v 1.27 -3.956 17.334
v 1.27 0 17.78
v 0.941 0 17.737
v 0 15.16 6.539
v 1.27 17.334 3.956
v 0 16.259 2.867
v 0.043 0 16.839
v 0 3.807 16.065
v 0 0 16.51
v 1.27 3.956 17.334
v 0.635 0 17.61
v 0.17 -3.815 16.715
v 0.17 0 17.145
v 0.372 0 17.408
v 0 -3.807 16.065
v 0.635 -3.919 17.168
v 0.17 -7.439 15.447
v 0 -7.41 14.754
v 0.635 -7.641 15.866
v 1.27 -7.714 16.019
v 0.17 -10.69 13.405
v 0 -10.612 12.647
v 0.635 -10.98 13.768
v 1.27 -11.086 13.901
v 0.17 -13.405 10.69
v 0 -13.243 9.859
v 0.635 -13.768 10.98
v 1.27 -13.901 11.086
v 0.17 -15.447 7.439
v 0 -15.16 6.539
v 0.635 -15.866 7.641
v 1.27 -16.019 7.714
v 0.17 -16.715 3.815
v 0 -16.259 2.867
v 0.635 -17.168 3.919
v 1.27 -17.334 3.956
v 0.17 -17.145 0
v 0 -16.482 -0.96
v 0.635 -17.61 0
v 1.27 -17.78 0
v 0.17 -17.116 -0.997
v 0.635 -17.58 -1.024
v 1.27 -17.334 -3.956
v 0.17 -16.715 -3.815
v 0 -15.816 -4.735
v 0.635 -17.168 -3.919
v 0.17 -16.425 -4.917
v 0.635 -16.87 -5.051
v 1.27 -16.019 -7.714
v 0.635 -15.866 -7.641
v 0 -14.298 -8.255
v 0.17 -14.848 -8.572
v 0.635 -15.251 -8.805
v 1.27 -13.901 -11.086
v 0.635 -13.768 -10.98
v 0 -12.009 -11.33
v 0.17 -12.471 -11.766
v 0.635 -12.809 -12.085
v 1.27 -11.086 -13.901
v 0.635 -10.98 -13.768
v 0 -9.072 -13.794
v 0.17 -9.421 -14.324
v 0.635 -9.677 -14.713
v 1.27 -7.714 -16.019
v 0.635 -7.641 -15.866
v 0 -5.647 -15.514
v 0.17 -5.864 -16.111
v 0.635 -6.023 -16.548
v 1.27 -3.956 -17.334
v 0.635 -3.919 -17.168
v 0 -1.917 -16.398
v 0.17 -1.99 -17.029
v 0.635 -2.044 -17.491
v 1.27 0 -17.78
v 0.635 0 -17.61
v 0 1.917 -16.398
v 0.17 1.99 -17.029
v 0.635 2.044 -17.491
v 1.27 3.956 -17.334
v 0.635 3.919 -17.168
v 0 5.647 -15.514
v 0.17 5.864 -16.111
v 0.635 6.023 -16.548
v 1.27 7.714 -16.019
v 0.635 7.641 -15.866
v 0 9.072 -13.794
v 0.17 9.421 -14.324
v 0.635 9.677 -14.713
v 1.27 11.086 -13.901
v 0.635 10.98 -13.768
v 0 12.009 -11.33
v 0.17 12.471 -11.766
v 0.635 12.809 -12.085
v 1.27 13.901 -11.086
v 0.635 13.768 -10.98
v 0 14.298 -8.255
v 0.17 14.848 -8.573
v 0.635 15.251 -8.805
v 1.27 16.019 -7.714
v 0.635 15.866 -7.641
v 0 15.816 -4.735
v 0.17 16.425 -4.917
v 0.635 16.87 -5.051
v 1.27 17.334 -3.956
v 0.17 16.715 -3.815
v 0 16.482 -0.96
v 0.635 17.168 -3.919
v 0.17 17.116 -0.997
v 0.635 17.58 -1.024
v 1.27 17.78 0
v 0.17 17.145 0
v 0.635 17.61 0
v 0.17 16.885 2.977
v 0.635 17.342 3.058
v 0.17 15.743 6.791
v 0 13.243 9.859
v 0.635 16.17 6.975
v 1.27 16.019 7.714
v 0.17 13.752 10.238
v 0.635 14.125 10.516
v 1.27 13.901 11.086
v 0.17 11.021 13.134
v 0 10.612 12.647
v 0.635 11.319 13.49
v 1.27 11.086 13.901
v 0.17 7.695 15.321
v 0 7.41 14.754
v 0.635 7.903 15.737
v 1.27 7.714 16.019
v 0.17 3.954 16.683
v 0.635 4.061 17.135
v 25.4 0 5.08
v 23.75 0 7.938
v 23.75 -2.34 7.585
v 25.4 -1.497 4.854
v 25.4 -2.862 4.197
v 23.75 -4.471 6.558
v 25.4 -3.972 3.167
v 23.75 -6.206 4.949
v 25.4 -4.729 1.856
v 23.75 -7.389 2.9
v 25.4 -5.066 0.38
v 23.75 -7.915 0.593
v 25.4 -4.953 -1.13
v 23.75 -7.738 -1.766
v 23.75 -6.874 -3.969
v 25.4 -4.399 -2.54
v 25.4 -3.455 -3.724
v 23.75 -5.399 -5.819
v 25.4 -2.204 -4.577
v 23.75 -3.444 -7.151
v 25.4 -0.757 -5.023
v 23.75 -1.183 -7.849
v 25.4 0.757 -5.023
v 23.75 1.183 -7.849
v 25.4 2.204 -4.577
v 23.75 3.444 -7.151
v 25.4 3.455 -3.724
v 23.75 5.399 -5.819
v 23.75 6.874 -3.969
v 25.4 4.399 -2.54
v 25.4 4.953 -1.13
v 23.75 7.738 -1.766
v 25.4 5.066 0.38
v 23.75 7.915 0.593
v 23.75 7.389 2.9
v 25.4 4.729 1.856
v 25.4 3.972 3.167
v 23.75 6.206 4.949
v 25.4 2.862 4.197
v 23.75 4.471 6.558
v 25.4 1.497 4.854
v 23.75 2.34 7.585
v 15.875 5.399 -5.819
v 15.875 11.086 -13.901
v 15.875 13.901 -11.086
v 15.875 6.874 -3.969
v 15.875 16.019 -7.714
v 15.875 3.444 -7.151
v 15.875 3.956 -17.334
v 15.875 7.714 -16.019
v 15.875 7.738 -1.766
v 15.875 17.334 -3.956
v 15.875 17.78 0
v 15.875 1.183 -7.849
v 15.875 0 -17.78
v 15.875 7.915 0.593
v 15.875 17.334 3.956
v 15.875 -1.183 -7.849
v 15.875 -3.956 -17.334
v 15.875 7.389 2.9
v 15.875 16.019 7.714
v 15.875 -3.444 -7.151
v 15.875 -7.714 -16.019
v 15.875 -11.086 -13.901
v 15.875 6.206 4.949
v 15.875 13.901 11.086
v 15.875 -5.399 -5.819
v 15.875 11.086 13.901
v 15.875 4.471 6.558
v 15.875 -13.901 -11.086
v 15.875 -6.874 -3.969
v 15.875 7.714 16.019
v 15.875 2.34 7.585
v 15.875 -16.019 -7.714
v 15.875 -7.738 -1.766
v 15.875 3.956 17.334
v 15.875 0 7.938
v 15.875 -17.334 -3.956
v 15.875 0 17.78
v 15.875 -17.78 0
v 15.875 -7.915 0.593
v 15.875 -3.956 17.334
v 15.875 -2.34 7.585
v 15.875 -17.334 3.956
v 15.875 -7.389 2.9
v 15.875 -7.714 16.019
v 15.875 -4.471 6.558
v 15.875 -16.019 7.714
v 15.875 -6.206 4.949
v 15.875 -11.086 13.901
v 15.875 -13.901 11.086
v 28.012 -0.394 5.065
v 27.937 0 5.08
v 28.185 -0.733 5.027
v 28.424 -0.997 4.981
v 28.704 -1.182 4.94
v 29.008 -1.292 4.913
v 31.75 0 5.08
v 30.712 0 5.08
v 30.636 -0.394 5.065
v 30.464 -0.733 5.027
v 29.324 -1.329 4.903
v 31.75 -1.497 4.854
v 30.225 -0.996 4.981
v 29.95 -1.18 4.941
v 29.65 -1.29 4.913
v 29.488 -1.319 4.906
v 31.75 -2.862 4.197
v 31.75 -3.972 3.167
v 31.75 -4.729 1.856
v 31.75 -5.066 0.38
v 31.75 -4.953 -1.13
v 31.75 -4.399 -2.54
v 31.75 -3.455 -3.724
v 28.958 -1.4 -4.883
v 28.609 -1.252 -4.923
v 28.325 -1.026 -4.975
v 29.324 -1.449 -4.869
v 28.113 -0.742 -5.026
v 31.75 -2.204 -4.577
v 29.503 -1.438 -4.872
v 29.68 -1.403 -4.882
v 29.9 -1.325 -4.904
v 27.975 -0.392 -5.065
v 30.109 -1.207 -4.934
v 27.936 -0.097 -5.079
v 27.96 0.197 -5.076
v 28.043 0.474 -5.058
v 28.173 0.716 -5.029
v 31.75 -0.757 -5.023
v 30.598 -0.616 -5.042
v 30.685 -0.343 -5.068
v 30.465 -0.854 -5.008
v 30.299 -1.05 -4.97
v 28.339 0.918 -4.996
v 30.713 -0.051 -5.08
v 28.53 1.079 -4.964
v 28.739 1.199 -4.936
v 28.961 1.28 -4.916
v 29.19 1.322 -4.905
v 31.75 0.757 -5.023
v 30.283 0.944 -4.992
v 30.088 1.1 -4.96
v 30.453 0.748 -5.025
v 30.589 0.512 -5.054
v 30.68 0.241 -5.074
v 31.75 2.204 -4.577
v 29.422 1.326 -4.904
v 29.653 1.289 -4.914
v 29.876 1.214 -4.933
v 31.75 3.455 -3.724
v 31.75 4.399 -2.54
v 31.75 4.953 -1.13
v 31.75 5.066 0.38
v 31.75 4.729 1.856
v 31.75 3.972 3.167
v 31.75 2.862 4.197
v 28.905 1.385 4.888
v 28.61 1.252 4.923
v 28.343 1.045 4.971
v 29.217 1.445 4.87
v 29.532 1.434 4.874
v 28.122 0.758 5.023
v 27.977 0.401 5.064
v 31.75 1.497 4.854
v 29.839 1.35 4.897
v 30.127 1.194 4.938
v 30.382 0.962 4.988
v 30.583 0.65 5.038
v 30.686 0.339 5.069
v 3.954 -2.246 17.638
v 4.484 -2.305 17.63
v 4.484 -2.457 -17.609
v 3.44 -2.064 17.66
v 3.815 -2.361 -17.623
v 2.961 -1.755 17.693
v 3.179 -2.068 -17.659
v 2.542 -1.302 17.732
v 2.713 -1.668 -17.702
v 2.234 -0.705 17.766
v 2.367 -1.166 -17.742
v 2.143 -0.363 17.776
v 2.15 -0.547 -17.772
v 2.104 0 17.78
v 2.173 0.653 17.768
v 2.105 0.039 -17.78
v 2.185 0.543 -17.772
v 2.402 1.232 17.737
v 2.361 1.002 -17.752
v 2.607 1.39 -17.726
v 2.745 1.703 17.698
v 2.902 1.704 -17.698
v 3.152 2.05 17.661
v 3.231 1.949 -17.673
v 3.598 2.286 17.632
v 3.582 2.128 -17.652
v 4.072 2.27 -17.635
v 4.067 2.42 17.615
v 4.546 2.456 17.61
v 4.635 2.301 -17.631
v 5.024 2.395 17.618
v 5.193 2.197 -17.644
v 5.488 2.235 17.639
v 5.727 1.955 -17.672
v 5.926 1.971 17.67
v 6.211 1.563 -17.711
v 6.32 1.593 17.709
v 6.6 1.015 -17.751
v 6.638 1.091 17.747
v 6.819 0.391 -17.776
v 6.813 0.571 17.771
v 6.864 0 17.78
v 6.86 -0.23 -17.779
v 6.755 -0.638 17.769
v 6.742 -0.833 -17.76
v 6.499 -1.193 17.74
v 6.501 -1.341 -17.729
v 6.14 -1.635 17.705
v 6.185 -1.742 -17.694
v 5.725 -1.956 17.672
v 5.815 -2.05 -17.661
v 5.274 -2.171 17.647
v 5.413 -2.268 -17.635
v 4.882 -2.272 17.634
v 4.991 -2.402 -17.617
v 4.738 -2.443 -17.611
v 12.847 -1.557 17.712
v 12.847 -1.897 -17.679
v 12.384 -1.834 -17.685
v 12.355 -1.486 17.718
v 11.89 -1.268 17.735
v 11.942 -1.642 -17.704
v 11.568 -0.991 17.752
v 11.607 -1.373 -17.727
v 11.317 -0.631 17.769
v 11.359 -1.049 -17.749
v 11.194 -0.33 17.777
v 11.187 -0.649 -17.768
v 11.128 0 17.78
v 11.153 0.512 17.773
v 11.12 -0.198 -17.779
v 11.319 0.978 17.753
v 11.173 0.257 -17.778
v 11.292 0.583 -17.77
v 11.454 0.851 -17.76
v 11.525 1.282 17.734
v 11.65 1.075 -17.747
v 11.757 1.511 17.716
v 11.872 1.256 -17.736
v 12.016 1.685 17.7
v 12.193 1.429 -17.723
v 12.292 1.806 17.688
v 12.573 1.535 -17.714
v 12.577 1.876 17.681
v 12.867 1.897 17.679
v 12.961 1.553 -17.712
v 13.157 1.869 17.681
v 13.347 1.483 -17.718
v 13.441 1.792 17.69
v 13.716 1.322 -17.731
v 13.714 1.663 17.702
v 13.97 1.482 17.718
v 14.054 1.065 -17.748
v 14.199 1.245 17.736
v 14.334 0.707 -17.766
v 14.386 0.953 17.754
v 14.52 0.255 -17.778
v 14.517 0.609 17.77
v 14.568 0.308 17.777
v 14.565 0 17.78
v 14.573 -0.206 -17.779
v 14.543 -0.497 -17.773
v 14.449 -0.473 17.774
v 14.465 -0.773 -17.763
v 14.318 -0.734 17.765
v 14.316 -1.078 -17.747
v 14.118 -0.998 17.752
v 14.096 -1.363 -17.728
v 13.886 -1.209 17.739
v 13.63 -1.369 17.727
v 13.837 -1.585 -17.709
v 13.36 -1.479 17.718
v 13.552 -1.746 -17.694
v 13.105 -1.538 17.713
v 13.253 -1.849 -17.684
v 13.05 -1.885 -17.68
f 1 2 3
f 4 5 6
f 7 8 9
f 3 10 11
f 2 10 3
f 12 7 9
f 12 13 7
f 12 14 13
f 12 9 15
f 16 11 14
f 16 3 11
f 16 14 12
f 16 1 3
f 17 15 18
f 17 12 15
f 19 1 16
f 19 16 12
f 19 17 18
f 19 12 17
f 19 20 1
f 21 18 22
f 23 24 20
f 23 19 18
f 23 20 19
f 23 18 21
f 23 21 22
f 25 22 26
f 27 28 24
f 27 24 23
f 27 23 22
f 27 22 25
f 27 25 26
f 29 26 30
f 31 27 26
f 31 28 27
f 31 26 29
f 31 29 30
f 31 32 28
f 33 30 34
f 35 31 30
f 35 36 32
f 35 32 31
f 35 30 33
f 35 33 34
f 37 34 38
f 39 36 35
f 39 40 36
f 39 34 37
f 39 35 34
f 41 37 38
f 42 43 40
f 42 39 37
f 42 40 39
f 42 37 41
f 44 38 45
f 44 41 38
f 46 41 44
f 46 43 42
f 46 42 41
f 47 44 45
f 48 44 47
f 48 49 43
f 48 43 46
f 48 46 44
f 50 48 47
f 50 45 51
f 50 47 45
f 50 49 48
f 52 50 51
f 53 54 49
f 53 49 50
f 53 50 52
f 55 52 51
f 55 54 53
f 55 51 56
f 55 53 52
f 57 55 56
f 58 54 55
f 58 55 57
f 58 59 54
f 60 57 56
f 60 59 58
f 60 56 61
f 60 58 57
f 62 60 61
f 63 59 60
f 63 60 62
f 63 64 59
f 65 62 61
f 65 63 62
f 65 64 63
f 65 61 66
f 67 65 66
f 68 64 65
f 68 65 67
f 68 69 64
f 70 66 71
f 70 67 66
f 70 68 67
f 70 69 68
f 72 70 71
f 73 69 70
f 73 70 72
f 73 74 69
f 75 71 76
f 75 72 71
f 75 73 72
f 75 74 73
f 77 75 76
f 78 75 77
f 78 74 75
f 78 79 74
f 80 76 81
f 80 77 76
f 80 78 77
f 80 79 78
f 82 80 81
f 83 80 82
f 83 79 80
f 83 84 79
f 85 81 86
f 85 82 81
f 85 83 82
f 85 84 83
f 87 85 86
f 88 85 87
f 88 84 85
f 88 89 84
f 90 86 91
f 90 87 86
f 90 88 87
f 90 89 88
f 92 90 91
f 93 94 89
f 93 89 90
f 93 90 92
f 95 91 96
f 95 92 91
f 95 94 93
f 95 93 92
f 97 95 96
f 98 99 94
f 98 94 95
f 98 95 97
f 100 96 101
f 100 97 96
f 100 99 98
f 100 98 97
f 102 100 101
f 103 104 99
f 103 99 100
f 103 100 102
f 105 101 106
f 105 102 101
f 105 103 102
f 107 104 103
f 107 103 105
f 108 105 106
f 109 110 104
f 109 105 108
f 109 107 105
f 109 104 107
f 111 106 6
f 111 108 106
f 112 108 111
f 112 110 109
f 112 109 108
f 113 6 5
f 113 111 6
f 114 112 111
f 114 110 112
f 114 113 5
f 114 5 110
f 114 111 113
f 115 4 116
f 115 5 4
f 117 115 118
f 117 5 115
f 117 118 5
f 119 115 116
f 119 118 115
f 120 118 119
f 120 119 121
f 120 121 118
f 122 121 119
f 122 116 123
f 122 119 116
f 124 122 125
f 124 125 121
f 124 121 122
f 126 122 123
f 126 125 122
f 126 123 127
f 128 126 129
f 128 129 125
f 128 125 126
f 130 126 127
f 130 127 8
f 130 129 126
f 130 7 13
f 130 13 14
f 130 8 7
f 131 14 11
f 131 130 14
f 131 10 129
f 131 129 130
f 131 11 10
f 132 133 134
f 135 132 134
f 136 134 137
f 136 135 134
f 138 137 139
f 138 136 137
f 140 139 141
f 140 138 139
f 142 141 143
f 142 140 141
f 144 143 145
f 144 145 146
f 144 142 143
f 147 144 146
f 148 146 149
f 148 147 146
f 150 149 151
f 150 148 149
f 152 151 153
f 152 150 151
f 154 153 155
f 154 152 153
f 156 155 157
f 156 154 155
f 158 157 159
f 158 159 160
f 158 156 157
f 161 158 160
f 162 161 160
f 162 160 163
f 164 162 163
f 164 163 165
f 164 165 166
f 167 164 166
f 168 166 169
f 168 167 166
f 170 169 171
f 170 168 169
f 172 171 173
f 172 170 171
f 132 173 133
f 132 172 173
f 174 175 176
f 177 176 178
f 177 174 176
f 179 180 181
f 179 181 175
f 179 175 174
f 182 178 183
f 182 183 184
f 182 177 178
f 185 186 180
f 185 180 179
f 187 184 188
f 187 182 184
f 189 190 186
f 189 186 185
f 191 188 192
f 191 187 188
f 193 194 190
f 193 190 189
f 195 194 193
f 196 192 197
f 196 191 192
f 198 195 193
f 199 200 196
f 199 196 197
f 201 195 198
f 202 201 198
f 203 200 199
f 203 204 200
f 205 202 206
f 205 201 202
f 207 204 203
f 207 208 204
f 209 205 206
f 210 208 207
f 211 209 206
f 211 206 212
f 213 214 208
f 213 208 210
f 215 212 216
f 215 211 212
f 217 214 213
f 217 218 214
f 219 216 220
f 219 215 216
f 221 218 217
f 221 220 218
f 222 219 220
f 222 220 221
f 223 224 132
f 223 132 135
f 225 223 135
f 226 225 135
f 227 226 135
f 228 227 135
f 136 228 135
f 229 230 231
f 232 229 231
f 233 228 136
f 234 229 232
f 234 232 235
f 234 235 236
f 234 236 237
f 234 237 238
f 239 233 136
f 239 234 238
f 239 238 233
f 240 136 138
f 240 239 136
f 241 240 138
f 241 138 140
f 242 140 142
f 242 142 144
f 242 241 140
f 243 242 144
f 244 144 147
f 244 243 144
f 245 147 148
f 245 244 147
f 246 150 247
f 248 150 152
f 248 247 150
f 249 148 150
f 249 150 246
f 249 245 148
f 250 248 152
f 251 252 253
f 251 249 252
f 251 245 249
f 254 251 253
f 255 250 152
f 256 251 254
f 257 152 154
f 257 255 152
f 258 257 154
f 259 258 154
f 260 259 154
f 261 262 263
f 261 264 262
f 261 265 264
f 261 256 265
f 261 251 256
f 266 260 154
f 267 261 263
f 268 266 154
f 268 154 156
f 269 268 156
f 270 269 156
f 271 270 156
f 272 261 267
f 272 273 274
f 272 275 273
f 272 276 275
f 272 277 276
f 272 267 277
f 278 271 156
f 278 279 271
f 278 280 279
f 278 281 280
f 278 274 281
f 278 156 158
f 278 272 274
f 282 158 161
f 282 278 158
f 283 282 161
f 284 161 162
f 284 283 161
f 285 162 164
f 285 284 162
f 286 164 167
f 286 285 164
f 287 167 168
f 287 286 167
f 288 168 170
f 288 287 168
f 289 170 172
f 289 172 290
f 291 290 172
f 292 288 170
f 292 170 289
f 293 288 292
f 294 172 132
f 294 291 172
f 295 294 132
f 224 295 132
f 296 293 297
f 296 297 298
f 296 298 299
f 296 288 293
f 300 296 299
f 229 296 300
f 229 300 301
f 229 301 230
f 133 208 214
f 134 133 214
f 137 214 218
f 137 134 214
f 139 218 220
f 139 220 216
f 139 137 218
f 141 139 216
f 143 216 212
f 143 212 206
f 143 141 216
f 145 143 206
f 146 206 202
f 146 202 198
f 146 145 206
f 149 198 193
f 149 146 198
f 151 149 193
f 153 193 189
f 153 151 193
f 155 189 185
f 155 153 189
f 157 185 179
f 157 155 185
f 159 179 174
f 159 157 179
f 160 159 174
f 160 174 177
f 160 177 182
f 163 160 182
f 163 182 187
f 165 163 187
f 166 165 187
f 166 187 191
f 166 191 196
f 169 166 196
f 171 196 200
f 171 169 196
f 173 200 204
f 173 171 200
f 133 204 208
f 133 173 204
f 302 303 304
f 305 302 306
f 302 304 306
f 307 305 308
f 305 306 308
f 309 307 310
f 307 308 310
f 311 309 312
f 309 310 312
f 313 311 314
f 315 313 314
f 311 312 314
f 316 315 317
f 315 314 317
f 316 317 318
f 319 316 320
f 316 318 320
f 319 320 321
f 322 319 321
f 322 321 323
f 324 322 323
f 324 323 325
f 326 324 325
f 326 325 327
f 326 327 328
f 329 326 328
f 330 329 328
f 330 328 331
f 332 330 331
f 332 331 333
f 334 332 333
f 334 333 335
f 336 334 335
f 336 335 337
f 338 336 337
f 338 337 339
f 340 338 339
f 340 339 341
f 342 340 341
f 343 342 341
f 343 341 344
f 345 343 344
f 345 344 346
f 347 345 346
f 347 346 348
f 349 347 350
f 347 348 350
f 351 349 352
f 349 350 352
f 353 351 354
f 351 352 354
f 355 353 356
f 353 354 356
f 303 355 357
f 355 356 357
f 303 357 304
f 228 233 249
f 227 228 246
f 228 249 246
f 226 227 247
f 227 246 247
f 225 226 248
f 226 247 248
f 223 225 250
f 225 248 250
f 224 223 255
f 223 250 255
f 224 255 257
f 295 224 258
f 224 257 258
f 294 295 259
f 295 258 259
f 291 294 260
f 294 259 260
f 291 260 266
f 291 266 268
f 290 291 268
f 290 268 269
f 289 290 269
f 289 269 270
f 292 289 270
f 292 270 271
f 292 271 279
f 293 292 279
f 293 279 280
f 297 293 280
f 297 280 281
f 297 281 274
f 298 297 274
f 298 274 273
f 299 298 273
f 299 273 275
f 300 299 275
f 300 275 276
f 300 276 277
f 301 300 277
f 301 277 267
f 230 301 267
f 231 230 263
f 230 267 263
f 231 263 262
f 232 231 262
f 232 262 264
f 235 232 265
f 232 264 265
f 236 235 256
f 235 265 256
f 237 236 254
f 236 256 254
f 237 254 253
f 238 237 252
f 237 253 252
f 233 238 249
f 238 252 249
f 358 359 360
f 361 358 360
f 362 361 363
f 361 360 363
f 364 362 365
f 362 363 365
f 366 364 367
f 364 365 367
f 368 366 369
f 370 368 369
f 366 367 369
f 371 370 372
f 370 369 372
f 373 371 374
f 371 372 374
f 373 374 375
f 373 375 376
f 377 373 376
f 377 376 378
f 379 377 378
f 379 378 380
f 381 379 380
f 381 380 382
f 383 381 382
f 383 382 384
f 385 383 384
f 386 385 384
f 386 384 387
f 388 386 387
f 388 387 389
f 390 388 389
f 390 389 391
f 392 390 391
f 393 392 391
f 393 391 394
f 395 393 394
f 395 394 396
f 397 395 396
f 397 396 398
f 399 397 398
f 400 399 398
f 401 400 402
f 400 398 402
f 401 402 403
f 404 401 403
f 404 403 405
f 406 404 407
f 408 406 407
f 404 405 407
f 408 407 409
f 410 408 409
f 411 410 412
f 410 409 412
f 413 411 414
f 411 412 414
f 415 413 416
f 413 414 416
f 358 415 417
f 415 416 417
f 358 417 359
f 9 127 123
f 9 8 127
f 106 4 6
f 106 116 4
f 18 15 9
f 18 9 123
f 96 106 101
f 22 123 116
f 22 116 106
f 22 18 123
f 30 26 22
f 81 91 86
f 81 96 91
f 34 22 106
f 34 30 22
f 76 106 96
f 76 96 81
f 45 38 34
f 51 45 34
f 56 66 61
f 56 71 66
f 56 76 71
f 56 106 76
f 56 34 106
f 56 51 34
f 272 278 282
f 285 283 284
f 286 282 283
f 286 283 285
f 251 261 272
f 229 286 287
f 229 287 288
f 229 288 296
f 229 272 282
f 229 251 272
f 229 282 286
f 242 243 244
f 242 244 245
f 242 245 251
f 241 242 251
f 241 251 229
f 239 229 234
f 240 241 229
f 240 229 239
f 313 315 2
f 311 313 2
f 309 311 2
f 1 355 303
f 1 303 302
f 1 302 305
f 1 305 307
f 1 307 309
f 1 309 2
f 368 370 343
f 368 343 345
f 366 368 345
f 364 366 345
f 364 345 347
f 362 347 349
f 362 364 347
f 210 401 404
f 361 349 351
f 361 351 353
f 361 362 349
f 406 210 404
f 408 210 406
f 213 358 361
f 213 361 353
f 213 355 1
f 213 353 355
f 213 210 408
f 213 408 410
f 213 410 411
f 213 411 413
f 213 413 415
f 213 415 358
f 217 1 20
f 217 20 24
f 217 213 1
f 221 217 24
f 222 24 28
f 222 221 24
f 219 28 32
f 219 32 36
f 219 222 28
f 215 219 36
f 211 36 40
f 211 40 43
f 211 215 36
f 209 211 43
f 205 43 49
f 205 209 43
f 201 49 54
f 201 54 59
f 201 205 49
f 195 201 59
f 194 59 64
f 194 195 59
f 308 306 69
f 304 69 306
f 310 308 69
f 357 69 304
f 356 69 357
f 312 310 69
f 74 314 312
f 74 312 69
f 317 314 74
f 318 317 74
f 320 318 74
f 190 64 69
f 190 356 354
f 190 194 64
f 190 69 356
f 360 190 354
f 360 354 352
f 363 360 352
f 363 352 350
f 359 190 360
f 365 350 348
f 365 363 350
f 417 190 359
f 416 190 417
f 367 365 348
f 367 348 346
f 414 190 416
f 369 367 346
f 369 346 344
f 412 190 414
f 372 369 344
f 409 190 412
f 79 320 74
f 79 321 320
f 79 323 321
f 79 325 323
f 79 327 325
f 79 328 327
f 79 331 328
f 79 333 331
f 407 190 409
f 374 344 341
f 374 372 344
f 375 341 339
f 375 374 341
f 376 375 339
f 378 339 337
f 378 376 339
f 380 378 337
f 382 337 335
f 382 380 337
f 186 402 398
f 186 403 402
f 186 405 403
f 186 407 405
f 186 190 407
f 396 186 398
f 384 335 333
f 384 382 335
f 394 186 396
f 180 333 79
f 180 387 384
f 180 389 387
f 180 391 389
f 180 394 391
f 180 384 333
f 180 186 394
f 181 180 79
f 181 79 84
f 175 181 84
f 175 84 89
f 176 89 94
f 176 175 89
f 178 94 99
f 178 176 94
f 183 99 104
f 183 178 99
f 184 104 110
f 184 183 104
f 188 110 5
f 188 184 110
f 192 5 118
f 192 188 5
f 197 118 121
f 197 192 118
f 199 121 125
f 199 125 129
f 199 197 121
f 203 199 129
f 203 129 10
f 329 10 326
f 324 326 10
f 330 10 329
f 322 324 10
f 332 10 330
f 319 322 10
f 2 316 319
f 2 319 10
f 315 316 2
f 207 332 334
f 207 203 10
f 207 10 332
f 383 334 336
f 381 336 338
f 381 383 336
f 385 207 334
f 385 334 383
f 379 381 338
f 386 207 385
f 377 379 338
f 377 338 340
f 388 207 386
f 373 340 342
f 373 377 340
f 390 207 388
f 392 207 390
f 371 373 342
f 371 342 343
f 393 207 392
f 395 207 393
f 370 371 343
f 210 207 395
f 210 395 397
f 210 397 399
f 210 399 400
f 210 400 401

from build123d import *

# Parameters (mm, degrees)
F_29_0_136_DIAMETER_HOLE1_D     = 3.4544
F_7_64_0_10938_DIAMETER_HOLE1_D = 2.778252
F_3_16_0_1875_DIAMETER_HOLE1_D  = 4.7625
FILLET1_R                       = 1.27


with BuildPart() as part:
    # Sketch1 → Revolve1 (revolve)
    with BuildSketch(Plane.XY):
        Polygon((0, 0), (0, 17.78), (15.875, 17.78), (15.875, 7.9375), (23.750221606, 7.9375), (25.4, 5.08), (31.75, 5.08), (31.75, 0), (9.963821138, 0), align=None)
    revolve(axis=Axis((-88.99, 0, 0), (1, 0, 0)))

    # #29 (0.136) Diameter Hole1 (through all)
    with Locations(Plane(origin=(12.84650937, 0.170730154, 17.779180274), x_dir=(0, 0.999953896174, -0.009602370845), z_dir=(0, 0.009602370845, 0.999953896174))):
        with Locations((0, 0)):
            Hole(F_29_0_136_DIAMETER_HOLE1_D / 2)

    # 7/64 (0.10938) Diameter Hole1 (through all)
    with Locations(Plane(origin=(29.324260763, 0.062415003, 5.079616557), x_dir=(0, 0.99992451912, -0.012286417829), z_dir=(0, 0.012286417829, 0.99992451912))):
        with Locations((0, 0)):
            Hole(F_7_64_0_10938_DIAMETER_HOLE1_D / 2)

    # 3/16 (0.1875) Diameter Hole1 (through all)
    with Locations(Plane(origin=(4.483845062, 0.076447724, 17.77983565), x_dir=(0, 0.999990756475, -0.004299647026), z_dir=(0, 0.004299647026, 0.999990756475))):
        with Locations((0, 0)):
            Hole(F_3_16_0_1875_DIAMETER_HOLE1_D / 2)

    # Fillet1
    fillet1_edges = [part.edges().sort_by_distance(p)[0] for p in [
        (0, -17.78, 0),
    ]]
    fillet(fillet1_edges, radius=FILLET1_R)


solid = part.part
